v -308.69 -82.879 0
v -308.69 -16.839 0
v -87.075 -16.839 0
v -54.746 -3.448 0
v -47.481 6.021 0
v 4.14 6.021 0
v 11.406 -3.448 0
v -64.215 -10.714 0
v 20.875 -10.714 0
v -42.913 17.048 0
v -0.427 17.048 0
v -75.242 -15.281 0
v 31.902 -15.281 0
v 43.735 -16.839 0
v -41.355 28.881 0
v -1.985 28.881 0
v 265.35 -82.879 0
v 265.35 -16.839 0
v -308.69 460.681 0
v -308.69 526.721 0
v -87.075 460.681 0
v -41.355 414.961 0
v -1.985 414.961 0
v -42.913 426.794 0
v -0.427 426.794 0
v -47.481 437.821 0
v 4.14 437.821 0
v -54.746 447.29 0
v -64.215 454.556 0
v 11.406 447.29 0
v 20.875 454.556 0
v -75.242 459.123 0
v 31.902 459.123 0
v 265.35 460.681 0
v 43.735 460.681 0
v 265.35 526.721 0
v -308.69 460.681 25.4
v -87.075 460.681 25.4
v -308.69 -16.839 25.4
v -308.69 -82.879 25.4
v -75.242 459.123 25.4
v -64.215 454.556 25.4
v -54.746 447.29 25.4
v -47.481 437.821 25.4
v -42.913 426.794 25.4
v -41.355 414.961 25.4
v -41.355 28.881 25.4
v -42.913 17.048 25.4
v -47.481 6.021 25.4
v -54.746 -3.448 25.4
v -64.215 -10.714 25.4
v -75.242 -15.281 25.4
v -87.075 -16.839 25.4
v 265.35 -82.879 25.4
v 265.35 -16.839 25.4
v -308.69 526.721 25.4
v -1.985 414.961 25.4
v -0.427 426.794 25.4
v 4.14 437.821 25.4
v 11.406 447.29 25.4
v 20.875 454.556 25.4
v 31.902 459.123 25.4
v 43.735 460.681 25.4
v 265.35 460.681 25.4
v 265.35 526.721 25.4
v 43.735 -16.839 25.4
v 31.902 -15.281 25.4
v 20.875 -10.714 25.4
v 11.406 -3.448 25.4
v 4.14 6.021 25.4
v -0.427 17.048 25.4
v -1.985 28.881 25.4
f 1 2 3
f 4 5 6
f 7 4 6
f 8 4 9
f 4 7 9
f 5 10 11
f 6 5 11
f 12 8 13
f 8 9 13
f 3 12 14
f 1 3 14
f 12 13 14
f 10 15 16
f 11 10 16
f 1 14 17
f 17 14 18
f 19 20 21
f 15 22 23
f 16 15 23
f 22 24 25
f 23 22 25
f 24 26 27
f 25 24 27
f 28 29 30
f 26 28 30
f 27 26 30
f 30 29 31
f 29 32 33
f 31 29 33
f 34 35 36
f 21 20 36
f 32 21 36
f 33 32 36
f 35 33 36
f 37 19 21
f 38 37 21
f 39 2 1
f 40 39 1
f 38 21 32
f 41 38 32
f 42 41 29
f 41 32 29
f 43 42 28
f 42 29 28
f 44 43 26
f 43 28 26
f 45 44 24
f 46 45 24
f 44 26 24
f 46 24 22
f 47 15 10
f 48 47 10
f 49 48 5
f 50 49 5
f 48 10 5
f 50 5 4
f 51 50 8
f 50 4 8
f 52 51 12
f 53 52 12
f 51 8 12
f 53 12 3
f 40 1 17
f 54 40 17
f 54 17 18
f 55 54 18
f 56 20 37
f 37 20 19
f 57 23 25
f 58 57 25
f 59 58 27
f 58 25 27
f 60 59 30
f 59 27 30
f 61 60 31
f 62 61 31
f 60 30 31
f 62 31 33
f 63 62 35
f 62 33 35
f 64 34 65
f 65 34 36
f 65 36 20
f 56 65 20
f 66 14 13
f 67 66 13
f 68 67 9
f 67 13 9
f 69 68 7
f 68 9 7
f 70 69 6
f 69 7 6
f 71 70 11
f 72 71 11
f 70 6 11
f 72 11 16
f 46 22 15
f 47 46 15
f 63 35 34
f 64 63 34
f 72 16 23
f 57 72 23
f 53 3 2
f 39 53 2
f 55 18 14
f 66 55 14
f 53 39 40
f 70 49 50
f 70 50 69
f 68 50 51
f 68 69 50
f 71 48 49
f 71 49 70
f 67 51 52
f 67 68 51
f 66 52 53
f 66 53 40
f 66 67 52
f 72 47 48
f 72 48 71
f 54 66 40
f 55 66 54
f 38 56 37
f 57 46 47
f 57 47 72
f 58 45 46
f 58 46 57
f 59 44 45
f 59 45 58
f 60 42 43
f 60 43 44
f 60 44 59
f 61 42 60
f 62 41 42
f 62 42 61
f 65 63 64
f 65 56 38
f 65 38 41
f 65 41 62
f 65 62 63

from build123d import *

# Parameters (mm, degrees)
F1_DEPTH = 25.4


with BuildPart() as f1:
    # F0 (on Top) → F1 (new body)
    with BuildSketch(Plane.XY):
        with BuildLine():
            Line((-308.69023, -16.839156), (-308.69023, -82.879156))
            Line((-308.69023, -82.879156), (265.34977, -82.879156))
            Line((265.34977, -82.879156), (265.34977, -16.839156))
            Line((265.34977, -16.839156), (43.73477, -16.839156))
            ThreePointArc((43.73477, -16.839156), (11.405848, -3.448078), (-1.98523, 28.880844))
            Line((-1.98523, 28.880844), (-1.98523, 414.960844))
            ThreePointArc((-1.98523, 414.960844), (11.405848, 447.289766), (43.73477, 460.680844))
            Line((43.73477, 460.680844), (265.34977, 460.680844))
            Line((265.34977, 460.680844), (265.34977, 526.720844))
            Line((265.34977, 526.720844), (-308.69023, 526.720844))
            Line((-308.69023, 526.720844), (-308.69023, 460.680844))
            Line((-308.69023, 460.680844), (-87.07523, 460.680844))
            ThreePointArc((-87.07523, 460.680844), (-54.746308, 447.289766), (-41.35523, 414.960844))
            Line((-41.35523, 414.960844), (-41.35523, 301.353365))
            Line((-41.35523, 301.353365), (-41.35523, 28.880844))
            ThreePointArc((-41.35523, 28.880844), (-54.746308, -3.448078), (-87.07523, -16.839156))
            Line((-87.07523, -16.839156), (-308.69023, -16.839156))
        make_face()
    extrude(amount=F1_DEPTH)


solid = f1.part
